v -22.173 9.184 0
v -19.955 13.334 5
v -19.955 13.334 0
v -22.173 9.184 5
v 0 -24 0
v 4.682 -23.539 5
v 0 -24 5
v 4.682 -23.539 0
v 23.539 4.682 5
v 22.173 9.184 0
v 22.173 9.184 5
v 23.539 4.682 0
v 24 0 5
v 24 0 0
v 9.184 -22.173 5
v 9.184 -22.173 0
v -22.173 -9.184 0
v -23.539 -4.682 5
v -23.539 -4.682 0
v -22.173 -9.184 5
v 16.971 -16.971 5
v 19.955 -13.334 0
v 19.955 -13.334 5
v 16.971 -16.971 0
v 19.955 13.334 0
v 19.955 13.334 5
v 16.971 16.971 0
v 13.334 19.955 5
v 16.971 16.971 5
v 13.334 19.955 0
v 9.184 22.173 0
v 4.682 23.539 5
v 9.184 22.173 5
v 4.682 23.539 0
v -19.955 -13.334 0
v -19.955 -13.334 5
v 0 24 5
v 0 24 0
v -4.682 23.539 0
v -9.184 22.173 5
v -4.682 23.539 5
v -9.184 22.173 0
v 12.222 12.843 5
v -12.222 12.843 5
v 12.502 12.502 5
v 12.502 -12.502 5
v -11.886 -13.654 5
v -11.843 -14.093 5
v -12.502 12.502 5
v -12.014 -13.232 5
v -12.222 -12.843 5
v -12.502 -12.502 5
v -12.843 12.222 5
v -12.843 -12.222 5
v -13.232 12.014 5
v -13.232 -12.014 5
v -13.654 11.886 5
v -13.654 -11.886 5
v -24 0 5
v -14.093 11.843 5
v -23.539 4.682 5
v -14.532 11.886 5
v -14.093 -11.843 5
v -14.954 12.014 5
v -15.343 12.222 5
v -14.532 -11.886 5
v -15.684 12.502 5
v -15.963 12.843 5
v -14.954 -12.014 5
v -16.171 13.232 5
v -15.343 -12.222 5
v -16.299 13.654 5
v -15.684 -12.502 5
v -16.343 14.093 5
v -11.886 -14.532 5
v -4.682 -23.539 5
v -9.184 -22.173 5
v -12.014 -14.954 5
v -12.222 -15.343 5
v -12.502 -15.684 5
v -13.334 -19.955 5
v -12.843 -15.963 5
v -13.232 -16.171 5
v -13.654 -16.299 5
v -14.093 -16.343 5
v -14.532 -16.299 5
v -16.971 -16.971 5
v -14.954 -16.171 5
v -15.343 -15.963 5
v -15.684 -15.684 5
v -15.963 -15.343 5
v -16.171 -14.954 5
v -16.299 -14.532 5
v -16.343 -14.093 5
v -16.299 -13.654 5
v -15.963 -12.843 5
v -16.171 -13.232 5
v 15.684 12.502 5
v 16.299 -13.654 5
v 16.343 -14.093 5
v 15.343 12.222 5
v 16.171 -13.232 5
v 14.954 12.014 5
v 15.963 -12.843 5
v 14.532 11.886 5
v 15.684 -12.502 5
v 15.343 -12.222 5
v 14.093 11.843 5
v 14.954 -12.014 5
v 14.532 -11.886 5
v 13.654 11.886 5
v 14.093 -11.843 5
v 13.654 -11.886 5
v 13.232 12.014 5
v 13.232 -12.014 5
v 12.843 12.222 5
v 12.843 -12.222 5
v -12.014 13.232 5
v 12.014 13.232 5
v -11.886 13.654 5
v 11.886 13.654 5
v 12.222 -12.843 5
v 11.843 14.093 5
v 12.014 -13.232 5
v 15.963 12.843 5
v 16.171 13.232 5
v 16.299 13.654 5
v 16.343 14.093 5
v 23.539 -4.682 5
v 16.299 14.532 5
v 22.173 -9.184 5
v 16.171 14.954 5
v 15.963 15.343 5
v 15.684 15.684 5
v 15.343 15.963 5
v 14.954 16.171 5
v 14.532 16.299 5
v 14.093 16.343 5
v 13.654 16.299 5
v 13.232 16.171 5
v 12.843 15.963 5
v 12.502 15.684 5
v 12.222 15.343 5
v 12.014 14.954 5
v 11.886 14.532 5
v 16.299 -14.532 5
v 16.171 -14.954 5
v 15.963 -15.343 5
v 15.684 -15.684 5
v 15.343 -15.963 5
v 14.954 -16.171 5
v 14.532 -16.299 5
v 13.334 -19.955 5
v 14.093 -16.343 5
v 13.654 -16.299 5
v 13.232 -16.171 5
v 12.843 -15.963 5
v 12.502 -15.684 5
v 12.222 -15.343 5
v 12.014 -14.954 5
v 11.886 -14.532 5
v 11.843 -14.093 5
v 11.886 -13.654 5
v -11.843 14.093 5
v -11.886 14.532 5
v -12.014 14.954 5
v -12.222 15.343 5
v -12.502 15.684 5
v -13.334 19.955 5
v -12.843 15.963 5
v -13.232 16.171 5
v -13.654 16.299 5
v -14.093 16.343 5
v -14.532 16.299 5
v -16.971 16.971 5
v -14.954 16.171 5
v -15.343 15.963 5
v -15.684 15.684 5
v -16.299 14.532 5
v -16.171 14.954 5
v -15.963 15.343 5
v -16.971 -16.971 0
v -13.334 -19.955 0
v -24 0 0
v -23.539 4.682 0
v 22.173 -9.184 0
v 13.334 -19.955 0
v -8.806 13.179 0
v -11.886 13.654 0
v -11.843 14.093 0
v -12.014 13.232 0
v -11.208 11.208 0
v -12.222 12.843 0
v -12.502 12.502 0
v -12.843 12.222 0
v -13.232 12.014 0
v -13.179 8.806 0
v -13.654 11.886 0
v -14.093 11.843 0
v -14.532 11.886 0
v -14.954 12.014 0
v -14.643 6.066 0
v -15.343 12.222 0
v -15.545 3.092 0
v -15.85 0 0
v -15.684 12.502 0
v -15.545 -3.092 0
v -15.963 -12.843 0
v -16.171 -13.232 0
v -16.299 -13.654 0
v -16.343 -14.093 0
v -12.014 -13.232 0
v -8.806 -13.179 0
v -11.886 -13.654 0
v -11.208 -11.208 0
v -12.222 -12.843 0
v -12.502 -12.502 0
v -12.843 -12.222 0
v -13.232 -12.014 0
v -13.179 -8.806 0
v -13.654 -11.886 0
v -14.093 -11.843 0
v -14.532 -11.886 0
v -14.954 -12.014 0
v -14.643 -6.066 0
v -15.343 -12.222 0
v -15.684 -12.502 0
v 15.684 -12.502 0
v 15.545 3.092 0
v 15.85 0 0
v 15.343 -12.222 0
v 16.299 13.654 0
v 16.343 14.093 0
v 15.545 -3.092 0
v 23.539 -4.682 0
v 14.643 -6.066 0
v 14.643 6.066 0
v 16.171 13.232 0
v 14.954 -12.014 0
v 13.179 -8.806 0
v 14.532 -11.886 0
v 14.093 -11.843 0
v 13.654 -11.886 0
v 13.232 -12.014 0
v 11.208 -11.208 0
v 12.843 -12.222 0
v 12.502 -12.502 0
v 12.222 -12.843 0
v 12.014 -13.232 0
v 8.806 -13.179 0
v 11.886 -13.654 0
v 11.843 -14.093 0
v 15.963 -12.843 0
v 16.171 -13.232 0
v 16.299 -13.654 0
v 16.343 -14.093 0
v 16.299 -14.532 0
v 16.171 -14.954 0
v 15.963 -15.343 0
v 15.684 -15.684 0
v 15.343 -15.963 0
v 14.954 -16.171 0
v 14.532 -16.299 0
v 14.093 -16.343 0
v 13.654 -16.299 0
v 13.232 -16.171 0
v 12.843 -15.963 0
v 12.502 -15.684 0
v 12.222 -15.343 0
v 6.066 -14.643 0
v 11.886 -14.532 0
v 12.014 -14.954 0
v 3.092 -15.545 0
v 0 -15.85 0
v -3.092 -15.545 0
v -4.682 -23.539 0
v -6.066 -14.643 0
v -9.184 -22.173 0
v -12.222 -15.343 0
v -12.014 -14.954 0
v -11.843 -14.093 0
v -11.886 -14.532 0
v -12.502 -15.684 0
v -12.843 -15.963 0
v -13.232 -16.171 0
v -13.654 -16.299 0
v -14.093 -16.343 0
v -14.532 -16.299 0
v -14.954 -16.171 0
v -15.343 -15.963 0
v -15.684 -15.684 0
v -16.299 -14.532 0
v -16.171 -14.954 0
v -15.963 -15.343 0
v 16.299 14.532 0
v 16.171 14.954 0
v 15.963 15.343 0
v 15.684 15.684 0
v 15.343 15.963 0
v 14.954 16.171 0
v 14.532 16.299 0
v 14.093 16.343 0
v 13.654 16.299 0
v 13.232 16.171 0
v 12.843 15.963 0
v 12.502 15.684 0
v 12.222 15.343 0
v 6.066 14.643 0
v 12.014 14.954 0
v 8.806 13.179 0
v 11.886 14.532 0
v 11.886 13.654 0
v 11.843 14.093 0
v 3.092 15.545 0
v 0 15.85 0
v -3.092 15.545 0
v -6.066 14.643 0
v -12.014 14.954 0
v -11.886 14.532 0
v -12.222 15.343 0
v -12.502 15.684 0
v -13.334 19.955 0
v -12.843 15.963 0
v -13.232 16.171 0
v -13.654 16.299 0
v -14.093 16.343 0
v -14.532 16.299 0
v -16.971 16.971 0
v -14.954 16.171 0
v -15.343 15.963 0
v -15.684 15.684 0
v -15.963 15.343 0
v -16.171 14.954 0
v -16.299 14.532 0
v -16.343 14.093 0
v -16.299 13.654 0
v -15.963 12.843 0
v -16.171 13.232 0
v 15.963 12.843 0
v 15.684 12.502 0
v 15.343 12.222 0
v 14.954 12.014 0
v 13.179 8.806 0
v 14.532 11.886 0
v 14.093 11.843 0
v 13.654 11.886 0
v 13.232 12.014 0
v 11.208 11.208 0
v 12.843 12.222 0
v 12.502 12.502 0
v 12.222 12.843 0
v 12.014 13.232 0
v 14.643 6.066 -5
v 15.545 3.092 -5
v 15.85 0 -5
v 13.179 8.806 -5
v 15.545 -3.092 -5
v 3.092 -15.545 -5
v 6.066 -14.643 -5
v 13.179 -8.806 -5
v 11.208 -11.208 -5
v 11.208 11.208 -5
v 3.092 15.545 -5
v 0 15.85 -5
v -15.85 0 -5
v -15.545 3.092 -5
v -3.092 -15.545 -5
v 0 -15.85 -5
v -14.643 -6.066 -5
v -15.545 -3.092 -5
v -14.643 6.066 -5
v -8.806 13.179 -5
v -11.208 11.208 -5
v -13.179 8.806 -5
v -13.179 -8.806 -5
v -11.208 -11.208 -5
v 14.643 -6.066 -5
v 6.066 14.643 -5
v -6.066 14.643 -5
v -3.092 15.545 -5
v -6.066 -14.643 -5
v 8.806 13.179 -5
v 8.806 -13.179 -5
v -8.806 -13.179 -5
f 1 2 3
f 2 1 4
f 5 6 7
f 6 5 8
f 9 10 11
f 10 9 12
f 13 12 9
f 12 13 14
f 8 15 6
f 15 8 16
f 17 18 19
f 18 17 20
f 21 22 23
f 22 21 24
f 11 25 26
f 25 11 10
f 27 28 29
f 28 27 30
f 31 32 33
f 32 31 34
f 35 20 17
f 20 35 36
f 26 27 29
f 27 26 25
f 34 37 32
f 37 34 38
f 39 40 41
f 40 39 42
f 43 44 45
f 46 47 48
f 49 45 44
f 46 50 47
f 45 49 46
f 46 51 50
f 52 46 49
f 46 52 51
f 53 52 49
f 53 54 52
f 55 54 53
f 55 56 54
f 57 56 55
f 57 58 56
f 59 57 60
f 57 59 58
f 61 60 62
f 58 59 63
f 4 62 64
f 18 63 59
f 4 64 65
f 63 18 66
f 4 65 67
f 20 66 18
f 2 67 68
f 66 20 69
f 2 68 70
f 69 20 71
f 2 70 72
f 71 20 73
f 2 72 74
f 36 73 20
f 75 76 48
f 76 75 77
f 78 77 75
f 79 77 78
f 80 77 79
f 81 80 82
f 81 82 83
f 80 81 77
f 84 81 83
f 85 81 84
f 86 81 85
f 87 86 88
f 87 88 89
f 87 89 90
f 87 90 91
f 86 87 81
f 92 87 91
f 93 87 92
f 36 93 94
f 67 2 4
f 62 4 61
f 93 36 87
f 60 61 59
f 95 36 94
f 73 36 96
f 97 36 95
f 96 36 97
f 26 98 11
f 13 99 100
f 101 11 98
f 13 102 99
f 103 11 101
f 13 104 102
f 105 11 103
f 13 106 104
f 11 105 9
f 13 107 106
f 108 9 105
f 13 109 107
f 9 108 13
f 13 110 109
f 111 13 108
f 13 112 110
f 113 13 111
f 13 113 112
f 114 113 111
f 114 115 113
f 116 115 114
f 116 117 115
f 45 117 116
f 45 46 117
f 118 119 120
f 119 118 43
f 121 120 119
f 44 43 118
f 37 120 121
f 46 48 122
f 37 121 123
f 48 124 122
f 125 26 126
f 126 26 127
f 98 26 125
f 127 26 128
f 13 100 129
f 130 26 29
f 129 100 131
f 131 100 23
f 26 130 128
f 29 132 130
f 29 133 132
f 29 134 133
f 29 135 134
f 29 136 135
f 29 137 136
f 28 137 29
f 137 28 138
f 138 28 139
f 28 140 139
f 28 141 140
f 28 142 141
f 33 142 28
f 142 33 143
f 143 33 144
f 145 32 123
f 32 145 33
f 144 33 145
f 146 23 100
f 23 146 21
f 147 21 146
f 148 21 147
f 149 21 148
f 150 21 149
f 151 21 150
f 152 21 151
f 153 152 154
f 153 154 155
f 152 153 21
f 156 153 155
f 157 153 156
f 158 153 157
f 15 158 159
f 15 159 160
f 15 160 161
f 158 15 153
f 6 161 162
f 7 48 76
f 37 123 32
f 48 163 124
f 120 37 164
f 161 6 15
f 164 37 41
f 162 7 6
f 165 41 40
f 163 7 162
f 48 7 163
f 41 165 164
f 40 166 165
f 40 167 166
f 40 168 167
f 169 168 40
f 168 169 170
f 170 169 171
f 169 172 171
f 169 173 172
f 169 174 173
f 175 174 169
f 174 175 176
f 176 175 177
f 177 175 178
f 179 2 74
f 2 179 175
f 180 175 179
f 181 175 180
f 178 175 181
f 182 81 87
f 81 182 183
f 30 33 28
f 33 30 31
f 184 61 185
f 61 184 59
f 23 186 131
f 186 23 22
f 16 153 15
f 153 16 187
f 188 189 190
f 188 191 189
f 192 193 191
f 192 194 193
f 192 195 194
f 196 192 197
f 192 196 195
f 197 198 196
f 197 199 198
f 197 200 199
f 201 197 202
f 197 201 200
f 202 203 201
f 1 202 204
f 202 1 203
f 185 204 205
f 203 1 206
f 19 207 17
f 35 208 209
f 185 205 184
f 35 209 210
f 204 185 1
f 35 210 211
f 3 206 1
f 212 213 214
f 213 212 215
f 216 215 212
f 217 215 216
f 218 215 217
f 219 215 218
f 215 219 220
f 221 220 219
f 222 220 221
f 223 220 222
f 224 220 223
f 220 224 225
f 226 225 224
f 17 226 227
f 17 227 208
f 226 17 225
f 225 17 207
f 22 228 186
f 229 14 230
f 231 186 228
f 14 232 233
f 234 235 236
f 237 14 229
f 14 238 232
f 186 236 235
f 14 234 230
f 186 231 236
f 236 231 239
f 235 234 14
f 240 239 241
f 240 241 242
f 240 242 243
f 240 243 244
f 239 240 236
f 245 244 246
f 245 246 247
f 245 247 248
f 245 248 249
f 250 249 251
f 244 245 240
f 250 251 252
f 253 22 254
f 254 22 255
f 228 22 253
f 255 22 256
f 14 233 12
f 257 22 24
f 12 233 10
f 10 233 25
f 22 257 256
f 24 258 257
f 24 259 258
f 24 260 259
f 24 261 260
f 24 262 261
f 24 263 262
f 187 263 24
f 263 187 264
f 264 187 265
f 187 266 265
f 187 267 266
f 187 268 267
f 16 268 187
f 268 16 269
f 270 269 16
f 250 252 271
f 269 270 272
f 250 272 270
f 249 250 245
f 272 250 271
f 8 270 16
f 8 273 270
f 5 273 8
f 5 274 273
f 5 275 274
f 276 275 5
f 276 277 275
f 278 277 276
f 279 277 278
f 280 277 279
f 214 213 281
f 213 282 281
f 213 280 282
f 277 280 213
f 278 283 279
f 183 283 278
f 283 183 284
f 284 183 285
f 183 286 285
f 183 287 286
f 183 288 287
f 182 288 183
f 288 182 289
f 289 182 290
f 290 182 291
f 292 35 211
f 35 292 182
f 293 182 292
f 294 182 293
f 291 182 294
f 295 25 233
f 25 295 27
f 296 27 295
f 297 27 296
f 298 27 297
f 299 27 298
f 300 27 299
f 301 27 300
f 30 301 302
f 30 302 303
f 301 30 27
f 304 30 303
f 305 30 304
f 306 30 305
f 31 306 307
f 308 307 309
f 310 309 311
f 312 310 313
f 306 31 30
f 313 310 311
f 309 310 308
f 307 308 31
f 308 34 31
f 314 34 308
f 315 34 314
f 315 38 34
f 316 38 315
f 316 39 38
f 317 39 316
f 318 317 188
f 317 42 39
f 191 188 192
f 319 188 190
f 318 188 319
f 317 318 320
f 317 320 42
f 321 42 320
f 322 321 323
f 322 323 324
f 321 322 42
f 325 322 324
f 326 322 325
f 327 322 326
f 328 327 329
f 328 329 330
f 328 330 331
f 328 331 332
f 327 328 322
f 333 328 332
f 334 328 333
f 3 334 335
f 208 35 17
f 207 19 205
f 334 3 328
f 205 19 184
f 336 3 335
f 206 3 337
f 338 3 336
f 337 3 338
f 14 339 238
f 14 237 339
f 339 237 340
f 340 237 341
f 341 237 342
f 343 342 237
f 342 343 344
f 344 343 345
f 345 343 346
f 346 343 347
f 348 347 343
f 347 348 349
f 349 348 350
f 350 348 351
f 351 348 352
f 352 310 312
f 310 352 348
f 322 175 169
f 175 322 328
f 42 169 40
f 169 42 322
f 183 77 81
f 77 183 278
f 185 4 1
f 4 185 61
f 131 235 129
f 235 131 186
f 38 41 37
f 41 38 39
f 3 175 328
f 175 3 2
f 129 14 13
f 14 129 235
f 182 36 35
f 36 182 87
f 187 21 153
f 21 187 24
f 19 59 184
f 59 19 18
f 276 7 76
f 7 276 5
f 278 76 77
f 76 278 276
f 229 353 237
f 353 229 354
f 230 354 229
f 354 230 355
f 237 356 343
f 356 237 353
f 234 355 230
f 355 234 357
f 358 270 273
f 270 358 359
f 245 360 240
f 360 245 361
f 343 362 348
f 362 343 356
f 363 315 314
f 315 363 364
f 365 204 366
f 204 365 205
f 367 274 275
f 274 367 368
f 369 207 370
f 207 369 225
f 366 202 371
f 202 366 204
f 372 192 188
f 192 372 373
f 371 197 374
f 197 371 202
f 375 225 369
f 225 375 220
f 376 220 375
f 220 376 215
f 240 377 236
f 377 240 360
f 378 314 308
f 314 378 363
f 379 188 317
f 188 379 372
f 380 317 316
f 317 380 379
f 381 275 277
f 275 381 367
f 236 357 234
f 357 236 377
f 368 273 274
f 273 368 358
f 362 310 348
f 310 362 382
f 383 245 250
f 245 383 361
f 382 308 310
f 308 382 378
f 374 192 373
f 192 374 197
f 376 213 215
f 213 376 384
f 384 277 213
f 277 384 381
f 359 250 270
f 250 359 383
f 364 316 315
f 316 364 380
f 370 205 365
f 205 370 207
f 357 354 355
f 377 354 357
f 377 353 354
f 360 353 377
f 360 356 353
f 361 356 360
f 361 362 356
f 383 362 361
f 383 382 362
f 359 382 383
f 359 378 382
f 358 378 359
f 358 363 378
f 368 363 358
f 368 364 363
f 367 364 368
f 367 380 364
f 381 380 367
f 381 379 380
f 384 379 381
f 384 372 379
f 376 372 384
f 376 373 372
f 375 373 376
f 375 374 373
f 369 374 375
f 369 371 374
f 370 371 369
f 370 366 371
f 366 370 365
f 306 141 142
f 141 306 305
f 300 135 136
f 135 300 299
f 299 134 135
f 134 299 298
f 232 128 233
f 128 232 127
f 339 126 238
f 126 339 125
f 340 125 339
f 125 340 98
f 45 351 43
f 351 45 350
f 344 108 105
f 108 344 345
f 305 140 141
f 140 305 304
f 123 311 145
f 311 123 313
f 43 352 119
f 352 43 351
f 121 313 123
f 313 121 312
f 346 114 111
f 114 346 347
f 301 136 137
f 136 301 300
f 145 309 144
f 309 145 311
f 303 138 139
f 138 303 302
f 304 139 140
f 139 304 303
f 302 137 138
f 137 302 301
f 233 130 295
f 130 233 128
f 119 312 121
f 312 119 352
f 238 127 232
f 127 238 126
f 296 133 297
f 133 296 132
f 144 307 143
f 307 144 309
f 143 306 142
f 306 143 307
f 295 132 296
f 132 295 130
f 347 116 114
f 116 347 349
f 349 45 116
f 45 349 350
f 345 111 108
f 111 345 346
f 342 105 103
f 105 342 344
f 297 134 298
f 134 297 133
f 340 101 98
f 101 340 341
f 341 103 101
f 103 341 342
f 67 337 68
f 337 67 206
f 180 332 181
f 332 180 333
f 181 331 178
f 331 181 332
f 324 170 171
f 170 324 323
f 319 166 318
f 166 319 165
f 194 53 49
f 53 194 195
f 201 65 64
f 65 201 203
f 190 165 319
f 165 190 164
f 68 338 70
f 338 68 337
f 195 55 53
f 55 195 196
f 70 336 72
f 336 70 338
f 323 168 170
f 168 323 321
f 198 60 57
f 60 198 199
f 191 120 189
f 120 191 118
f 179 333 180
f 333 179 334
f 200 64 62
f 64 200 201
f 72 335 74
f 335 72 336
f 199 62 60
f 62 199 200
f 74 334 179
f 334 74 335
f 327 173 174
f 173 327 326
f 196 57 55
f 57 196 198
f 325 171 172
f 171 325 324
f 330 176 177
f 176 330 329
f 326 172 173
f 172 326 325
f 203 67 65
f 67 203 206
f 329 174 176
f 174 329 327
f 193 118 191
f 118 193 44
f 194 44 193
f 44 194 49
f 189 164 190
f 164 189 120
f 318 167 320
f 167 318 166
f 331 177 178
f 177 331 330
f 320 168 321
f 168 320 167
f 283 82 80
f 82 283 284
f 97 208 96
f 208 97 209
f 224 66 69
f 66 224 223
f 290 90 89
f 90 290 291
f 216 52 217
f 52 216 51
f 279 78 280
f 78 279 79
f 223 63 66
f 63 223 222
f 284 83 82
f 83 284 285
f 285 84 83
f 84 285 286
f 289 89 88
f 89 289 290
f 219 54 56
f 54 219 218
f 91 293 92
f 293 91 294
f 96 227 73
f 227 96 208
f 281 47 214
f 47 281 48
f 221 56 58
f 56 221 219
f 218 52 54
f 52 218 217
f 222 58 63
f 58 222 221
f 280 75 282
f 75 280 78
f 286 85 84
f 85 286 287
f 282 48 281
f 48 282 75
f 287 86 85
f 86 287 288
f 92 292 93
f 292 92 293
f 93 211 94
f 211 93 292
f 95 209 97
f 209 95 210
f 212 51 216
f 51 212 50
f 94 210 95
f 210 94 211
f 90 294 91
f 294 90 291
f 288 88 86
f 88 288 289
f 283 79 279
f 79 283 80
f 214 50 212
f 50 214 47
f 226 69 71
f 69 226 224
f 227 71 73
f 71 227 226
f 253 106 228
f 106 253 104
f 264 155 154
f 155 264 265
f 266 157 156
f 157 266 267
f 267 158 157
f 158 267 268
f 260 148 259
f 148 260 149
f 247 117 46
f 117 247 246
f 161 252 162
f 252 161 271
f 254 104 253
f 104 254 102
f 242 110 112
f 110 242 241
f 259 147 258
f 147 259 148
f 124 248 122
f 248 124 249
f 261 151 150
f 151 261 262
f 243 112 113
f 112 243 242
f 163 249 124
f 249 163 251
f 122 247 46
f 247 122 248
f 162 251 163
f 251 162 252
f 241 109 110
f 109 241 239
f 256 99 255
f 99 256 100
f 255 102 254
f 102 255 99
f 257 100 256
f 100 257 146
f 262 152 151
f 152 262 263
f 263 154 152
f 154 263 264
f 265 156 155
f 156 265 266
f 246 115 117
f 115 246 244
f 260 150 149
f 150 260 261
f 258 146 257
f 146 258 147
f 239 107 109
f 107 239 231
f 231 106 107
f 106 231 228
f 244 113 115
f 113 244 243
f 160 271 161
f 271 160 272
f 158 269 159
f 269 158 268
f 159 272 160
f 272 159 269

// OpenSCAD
$fn = 32;

// ----------------------------------------------------------------------
// Retaining cap: 6002 cover, 48 mm, spigot 31.7 mm
// ----------------------------------------------------------------------

// --- parameters (mm) ---
plate_d = 48;             // cover diameter
plate_t = 5;              // cover thickness
boss_d = 31.7;            // spigot that enters the housing
boss_h = 5;               // spigot height
bolt_d = 4.5;             // bolt clearance
bolt_r = 19.93;           // bolt circle radius

module cover() {
  cylinder(h = plate_t, d = plate_d);
}

module spigot() {
  /* sunk 1 mm into the cover; the spigot sets the overall height */
  translate([0, 0, -boss_h]) cylinder(h = boss_h + 1, d = boss_d);
}

difference() {
  union() {
    cover();
    spigot();
  }
  for (i = [0 : 3]) rotate([0, 0, 45 + i * 90]) translate([bolt_r, 0, -boss_h - 1])
    cylinder(h = boss_h + plate_t + 2, d = bolt_d);
}
